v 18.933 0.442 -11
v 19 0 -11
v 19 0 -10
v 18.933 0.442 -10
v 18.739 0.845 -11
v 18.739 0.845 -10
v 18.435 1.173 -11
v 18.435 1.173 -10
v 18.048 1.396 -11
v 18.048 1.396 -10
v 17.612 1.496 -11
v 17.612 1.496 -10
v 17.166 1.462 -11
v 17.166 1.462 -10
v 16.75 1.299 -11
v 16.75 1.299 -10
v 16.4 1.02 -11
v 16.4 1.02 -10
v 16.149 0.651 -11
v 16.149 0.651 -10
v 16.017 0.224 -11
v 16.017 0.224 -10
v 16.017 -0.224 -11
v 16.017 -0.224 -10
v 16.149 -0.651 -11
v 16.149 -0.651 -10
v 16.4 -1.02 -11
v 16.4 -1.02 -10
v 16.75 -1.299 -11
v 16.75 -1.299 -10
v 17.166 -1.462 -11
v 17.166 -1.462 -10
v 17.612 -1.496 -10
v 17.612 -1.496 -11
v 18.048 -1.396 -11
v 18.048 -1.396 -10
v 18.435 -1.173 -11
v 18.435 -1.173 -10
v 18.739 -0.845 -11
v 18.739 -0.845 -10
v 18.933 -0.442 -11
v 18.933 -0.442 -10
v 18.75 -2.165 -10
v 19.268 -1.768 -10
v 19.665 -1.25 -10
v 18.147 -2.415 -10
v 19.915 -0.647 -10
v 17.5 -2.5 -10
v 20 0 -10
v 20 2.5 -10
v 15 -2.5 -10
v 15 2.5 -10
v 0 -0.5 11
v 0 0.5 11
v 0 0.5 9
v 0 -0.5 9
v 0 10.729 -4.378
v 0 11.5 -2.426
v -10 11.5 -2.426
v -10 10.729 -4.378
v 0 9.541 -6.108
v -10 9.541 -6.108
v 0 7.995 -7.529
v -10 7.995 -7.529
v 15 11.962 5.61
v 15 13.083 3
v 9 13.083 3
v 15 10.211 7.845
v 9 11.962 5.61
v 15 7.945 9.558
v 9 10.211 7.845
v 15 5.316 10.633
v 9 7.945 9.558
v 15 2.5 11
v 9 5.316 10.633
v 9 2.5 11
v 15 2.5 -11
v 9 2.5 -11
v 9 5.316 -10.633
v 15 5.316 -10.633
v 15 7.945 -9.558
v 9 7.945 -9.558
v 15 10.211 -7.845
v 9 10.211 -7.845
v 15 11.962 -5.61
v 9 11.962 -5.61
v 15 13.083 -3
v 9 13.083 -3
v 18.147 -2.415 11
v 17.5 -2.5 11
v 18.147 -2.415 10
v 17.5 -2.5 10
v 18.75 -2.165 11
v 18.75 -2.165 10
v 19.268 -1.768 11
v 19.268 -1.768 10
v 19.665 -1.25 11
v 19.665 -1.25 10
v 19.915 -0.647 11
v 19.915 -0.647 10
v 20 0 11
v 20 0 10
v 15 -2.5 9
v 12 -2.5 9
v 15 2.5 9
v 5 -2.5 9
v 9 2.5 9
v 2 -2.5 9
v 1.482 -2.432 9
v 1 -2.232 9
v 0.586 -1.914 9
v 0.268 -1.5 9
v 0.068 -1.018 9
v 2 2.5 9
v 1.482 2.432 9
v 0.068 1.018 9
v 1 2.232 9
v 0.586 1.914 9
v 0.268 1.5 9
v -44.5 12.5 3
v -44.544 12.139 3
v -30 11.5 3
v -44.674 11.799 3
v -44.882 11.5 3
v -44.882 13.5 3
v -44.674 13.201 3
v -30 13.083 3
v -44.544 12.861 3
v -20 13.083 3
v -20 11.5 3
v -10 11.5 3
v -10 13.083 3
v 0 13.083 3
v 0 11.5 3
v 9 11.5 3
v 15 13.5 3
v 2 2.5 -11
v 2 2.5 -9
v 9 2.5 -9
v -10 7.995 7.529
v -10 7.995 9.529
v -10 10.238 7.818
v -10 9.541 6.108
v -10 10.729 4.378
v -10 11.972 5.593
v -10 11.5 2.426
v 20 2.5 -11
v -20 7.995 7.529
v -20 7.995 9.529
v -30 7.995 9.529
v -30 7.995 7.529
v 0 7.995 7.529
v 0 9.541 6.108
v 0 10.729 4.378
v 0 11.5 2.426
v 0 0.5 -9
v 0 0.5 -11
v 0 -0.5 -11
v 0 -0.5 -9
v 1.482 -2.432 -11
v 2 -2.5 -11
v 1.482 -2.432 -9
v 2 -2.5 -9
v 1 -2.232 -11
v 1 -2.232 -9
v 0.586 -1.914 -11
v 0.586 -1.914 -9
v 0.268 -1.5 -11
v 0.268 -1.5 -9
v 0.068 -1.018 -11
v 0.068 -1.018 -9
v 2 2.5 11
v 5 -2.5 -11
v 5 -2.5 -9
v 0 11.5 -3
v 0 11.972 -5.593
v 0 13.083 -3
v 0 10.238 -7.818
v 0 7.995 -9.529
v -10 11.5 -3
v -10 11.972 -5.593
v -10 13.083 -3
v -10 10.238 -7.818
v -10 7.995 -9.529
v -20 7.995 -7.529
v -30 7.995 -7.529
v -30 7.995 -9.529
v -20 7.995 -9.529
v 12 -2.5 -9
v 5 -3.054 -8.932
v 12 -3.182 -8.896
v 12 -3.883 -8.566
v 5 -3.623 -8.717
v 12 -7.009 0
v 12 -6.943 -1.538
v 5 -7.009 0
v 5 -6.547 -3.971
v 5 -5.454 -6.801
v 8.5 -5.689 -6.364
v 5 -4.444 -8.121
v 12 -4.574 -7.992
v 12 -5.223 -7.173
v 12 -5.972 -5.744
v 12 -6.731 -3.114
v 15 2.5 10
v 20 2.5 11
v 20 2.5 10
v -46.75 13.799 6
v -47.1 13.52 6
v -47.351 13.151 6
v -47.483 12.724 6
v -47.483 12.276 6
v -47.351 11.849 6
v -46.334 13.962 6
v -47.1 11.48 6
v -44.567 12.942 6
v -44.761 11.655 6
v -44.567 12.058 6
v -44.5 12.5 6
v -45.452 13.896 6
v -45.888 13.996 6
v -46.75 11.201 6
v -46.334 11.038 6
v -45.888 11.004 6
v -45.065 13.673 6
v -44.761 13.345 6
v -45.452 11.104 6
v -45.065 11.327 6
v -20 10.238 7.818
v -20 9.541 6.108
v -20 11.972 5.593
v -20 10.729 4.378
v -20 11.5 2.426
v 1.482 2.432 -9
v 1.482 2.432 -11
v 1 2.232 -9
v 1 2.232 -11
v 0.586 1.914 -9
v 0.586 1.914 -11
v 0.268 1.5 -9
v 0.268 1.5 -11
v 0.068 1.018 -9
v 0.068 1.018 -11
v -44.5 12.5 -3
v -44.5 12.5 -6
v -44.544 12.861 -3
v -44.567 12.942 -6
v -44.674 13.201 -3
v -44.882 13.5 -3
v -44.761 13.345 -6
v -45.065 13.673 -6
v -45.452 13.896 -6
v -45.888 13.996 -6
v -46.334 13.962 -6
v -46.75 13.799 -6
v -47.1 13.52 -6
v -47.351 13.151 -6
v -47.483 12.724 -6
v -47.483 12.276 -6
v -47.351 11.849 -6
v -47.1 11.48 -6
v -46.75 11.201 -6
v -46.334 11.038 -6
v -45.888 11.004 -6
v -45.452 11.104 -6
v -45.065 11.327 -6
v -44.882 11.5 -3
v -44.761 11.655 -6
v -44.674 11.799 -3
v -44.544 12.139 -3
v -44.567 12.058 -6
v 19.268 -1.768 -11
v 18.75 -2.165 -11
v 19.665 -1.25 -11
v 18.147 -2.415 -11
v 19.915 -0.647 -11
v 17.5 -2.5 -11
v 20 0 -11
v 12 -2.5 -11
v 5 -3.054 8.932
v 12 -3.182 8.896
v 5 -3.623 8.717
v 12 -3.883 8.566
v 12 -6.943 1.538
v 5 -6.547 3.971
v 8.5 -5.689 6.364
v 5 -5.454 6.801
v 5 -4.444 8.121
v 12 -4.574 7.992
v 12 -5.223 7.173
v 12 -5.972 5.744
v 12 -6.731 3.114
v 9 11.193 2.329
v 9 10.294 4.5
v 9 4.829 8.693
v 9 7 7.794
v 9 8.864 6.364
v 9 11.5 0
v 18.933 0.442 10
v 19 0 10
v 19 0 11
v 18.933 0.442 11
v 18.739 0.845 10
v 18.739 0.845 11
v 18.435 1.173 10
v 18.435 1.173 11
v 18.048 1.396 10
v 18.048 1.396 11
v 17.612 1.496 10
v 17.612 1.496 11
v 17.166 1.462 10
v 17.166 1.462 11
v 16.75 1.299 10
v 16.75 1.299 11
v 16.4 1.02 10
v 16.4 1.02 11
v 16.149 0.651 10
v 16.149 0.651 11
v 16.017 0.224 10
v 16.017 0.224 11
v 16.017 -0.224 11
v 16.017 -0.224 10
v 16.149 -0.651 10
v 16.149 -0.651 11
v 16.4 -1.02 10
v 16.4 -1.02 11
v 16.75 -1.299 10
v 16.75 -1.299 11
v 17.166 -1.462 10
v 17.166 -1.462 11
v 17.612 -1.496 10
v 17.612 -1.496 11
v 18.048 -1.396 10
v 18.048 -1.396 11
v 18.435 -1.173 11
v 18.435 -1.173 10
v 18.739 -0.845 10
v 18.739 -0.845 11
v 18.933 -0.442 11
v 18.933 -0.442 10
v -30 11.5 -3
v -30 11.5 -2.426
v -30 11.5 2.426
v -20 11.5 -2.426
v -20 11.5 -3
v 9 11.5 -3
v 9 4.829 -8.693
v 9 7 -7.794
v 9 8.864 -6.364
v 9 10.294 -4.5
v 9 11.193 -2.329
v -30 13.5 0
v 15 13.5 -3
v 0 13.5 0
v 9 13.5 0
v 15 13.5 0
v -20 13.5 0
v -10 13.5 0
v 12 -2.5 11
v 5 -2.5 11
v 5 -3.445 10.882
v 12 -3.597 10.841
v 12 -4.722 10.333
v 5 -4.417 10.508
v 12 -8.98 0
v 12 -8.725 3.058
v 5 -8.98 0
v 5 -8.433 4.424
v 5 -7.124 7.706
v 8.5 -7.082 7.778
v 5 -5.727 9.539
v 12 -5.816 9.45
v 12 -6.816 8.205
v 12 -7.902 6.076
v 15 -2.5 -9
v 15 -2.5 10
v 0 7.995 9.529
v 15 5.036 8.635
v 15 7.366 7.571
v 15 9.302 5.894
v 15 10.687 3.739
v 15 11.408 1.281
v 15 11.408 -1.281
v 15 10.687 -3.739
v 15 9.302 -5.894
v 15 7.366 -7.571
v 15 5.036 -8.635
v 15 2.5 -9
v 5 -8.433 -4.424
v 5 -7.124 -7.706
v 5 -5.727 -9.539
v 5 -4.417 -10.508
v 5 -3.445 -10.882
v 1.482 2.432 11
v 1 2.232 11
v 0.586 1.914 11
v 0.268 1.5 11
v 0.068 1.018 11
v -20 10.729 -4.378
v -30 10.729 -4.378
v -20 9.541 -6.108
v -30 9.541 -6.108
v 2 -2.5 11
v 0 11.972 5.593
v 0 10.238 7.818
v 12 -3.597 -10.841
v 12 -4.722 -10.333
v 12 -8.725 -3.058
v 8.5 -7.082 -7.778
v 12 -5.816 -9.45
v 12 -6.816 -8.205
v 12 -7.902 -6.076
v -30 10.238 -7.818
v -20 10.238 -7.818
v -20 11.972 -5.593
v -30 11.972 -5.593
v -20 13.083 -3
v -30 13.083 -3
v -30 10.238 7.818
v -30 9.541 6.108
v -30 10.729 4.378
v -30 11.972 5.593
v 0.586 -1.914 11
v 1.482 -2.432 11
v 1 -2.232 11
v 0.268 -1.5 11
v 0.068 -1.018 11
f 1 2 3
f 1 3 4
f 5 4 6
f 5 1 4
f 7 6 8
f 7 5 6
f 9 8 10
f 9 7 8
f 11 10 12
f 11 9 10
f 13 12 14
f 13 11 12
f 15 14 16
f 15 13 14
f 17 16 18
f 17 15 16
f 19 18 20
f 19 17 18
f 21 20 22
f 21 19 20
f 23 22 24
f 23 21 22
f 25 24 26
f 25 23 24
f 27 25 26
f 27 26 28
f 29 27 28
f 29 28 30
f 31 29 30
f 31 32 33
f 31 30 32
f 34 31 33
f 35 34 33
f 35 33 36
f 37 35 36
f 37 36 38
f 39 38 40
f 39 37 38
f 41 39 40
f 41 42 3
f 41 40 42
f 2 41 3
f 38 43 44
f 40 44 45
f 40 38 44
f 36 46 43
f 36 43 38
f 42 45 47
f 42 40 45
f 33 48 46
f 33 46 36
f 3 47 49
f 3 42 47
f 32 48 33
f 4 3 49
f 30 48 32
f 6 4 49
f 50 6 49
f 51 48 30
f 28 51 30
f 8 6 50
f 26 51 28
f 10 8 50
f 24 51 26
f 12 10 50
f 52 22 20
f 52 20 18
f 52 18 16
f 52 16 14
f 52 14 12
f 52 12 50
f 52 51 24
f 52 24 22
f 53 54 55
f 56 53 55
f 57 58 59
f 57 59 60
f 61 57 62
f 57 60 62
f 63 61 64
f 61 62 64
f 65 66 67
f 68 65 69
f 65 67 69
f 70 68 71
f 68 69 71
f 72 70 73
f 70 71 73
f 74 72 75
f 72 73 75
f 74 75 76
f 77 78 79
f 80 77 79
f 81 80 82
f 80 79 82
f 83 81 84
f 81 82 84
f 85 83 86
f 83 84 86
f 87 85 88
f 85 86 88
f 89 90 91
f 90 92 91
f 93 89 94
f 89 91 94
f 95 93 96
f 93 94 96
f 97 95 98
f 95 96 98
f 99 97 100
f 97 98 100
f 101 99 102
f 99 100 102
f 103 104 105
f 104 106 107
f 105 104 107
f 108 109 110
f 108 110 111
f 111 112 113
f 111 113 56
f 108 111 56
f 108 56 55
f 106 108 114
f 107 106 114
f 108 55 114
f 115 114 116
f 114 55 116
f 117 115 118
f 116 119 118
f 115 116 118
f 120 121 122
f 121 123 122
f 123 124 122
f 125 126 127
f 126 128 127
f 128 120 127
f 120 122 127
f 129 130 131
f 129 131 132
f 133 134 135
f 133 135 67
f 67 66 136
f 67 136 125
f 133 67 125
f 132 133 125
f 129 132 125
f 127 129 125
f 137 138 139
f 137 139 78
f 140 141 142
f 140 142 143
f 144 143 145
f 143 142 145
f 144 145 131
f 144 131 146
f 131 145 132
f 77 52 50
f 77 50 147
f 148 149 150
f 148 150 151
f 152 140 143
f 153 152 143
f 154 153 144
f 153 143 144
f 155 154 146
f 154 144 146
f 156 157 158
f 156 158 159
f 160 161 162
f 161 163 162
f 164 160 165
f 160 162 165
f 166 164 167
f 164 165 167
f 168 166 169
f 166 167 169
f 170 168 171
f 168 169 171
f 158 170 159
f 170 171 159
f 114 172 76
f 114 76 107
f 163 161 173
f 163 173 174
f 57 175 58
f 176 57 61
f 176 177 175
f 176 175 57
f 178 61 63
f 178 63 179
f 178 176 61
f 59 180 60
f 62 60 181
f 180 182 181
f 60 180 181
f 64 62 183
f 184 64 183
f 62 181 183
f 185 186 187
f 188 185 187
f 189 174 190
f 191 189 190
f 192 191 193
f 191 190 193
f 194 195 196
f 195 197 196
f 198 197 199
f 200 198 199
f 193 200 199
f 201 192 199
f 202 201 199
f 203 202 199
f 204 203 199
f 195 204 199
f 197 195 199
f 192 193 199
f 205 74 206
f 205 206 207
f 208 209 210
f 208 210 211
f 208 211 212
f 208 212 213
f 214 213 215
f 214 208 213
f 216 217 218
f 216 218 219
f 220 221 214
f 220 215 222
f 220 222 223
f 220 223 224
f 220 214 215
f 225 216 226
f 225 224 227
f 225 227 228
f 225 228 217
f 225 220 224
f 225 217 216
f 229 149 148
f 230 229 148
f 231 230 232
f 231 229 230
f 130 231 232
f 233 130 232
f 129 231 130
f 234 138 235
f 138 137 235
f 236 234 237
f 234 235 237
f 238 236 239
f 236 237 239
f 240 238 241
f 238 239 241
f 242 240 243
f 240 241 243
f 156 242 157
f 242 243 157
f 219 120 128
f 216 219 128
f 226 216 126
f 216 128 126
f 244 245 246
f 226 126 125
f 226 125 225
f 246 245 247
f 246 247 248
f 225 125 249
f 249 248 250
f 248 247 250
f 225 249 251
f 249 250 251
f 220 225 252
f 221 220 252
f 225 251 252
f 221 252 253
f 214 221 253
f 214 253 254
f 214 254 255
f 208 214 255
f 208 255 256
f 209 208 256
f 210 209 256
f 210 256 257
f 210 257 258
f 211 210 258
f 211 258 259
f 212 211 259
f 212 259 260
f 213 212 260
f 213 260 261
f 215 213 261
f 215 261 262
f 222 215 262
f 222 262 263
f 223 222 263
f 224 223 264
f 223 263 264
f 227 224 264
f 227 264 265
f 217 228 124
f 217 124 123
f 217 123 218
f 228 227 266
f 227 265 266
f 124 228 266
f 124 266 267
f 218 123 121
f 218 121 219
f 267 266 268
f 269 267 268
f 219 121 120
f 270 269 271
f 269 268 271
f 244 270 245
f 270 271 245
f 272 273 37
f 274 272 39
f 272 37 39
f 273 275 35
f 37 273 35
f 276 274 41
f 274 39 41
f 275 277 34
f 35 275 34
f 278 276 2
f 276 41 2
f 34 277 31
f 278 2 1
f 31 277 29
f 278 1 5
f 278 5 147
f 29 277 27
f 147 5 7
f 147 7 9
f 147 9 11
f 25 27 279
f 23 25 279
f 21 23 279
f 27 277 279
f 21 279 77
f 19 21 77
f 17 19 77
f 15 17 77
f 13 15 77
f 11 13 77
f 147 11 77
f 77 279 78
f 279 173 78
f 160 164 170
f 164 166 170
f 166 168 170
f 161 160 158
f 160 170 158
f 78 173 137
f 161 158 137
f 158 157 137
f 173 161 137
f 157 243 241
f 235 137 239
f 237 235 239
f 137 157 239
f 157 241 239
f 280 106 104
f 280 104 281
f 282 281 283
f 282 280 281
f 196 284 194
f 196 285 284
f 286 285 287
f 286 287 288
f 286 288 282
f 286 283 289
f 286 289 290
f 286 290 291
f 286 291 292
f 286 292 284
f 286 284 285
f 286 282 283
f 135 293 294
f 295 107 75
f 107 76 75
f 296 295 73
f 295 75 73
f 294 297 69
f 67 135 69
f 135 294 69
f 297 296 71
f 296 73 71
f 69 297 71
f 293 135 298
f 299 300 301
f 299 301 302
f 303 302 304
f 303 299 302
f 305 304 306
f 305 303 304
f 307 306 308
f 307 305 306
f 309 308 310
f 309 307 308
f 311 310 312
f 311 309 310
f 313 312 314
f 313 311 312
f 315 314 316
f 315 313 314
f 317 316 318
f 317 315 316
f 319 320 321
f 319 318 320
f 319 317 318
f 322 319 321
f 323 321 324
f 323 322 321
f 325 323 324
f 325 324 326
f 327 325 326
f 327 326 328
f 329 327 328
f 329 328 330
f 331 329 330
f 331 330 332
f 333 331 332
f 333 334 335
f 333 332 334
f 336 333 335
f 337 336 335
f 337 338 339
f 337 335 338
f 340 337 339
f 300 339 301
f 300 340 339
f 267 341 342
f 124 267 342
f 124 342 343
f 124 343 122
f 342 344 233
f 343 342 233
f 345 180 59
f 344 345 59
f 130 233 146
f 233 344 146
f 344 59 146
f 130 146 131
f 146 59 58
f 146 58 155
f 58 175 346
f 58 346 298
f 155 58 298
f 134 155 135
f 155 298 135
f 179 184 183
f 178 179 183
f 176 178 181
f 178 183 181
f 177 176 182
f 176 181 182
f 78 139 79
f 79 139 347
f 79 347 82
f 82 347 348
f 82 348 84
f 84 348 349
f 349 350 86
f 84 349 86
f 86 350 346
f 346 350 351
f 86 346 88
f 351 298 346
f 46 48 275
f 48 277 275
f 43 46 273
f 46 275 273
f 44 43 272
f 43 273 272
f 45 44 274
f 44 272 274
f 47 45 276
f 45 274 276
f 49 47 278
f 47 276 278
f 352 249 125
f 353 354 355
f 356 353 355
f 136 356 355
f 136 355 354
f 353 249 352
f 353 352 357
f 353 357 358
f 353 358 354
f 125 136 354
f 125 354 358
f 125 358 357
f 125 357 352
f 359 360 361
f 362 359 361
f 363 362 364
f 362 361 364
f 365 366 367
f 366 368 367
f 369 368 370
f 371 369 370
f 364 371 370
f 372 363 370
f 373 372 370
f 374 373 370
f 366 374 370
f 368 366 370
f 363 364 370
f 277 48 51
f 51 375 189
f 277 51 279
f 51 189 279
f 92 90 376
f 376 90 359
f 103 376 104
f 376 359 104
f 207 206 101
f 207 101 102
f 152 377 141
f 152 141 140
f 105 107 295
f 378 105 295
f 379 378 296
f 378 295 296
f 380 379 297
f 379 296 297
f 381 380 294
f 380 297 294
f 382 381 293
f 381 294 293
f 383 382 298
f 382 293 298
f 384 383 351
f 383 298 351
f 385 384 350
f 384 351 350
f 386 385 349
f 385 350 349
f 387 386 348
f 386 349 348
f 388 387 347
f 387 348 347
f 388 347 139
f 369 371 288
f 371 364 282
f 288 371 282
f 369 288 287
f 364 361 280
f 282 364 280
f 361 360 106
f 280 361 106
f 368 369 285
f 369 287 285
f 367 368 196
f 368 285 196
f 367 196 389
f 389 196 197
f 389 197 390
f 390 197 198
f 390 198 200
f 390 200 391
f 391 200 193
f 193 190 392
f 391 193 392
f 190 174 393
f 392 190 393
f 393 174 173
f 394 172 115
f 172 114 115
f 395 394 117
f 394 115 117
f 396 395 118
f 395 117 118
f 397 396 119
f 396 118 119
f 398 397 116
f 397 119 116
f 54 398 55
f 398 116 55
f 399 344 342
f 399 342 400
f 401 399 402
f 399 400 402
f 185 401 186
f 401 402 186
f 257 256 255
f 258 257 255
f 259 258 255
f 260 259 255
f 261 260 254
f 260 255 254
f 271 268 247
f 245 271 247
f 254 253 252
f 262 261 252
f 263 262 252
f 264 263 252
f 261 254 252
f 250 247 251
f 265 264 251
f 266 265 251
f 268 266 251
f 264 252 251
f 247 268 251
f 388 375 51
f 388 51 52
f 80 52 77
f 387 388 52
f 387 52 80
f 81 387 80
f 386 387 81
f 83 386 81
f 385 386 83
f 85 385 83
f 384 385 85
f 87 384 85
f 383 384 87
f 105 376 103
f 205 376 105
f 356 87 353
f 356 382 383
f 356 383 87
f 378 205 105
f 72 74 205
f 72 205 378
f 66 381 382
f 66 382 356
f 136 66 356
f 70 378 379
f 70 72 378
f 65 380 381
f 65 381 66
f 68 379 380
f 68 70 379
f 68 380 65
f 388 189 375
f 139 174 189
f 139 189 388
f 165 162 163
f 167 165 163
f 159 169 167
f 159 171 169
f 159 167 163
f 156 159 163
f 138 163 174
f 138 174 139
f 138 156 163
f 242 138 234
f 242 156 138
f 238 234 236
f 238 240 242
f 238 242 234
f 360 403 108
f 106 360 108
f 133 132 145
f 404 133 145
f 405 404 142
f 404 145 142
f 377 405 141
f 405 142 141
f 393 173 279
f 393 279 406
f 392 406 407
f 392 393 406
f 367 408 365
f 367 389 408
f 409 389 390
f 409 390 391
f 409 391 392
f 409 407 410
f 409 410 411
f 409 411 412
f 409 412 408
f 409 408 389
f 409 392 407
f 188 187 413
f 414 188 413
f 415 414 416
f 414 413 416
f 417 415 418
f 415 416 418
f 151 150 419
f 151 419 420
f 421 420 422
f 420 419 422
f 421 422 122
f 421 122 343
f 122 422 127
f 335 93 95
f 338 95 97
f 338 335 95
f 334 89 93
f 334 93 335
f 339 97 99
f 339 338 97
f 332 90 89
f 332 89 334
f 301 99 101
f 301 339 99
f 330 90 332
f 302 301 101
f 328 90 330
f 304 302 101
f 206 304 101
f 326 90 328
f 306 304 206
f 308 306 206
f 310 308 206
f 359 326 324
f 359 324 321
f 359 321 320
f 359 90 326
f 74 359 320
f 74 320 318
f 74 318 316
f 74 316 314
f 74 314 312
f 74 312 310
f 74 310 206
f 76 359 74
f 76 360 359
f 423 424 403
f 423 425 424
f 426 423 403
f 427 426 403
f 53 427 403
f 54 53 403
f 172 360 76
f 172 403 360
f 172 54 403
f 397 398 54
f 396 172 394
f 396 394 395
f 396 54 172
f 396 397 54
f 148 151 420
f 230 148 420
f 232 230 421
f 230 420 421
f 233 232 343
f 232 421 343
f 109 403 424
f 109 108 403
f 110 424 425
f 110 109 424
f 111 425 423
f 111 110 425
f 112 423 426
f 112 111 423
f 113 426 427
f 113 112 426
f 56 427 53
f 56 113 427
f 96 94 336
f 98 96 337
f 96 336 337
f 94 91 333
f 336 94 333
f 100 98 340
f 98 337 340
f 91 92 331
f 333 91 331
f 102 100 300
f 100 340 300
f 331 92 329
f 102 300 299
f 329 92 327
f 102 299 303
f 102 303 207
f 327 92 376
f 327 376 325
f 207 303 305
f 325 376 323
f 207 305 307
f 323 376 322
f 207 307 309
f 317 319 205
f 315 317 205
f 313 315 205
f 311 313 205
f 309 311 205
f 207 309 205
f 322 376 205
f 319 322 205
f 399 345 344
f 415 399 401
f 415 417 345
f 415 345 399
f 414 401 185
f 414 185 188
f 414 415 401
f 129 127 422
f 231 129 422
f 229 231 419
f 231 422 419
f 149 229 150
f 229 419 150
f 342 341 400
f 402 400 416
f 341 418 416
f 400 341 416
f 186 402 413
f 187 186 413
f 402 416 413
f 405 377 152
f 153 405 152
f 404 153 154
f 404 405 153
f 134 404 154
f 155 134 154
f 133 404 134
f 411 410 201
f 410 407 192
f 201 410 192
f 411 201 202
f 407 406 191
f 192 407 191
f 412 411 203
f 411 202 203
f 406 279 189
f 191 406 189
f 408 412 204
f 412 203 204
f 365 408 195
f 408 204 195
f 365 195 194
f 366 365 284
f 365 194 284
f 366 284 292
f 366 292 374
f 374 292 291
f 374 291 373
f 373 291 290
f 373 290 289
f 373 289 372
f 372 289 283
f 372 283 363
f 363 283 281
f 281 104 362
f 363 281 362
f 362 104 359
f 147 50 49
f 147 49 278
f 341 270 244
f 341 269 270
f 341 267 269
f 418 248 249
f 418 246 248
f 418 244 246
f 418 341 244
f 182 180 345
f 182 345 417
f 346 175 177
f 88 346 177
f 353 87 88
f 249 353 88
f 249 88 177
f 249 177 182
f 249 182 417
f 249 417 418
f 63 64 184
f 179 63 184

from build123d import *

# Parameters (mm, degrees)
SKETCH1_W                = 2
SKETCH1_H                = 5
BOSS_EXTRUDE1_DEPTH      = 15
BOSS_EXTRUDE1_2_DEPTH    = 15
SKETCH2_W                = 1
SKETCH2_H                = 5
BOSS_EXTRUDE2_DEPTH      = 5
CUT_EXTRUDE1_DEPTH       = 30.107559156
CUT_EXTRUDE1_DEPTH_BACK  = 30.107559156
SKETCH3_R                = 1.5
SWEEP1_START             = 9
SWEEP1_DEPTH             = 6
BOSS_EXTRUDE3_DEPTH      = 12
CUT_EXTRUDE2_DEPTH       = 5
FILLET1_R                = 2
BOSS_EXTRUDE6_START      = -6
SKETCH7_W                = 6
SKETCH7_H                = 2
BOSS_EXTRUDE6_DEPTH      = 61
BOSS_EXTRUDE7_DEPTH      = 3
BOSS_EXTRUDE7_DEPTH_BACK = 9
SKETCH8_R                = 1.5
FILLET2_R                = 2.5
BOSS_EXTRUDE10_DEPTH     = 10
LPATTERN1_COUNT          = 2
LPATTERN1_PITCH          = 20


# Read off the part's stored shape, not the designer's step: Sweep1
with BuildPart() as part:
    # Sketch1 → Boss-Extrude1 (new body)
    with BuildSketch(Plane(origin=(0, 0, 0), x_dir=(0, 0, -1), z_dir=(1, 0, 0))):
        with Locations((-10, 0)):
            Rectangle(SKETCH1_W, SKETCH1_H)
    extrude(amount=BOSS_EXTRUDE1_DEPTH)



with BuildPart() as body_2:
    # Sketch1 → Boss-Extrude1 2 (new body)
    with BuildSketch(Plane(origin=(0, 0, 0), x_dir=(0, 0, -1), z_dir=(1, 0, 0))):
        with Locations((10, 0)):
            Rectangle(SKETCH1_W, SKETCH1_H)
    extrude(amount=BOSS_EXTRUDE1_2_DEPTH)


with BuildPart() as part_1:
    add(part.part)

    add(body_2.part)  # Boss-Extrude2 merges body 2
    # Sketch2 → Boss-Extrude2 (add)
    with BuildSketch(Plane(origin=(15, 0, 0), x_dir=(0, 0, -1), z_dir=(1, 0, 0))):
        with Locations((10.5, 0)):
            Rectangle(SKETCH2_W, SKETCH2_H)
        with Locations((-10.5, 0)):
            Rectangle(SKETCH2_W, SKETCH2_H)
    extrude(amount=BOSS_EXTRUDE2_DEPTH)

    # Sketch3 → Cut-Extrude1 (cut, two sides: drawn at the far end of the back side and taken through both)
    with BuildSketch(Plane.XY.offset(-10).offset(-CUT_EXTRUDE1_DEPTH_BACK)):
        with Locations((17.5, 0)):
            Circle(SKETCH3_R)
    extrude(amount=CUT_EXTRUDE1_DEPTH + CUT_EXTRUDE1_DEPTH_BACK, mode=Mode.SUBTRACT)

    # Sweep1 outline → Sweep1 (add)
    with BuildSketch(Plane.YZ.offset(SWEEP1_START)):
        with BuildLine():
            ThreePointArc((2.5, -11), (13.5, 0), (2.5, 11))
            Line((2.5, 11), (2.5, 9))
            ThreePointArc((2.5, 9), (11.5, 0), (2.5, -9))
            Line((2.5, -9), (2.5, -11))
        make_face()
    extrude(amount=SWEEP1_DEPTH)

    # Sketch5 → Boss-Extrude3 (add)
    with BuildSketch(Plane(origin=(0, 0, 0), x_dir=(0, 0, -1), z_dir=(1, 0, 0))):
        with BuildLine():
            Line((-9, -2.5), (-11, -2.5))
            add(Edge.make_bspline(
                [(-11, -2.5), (-11, -8.980170496), (0, -8.980170496)],
                knots=[3.141592654, 3.141592654, 3.141592654, 4.71238898, 4.71238898, 4.71238898], degree=2, weights=[1, 0.707106781, 1]))
            Line((0, -8.980170496), (0, -7.009343108))
            add(Edge.make_bspline(
                [(-9, -2.5), (-9, -7.009343108), (0, -7.009343108)],
                knots=[3.141592654, 3.141592654, 3.141592654, 4.71238898, 4.71238898, 4.71238898], degree=2, weights=[1, 0.707106781, 1]))
        make_face()
    boss_extrude3 = extrude(amount=BOSS_EXTRUDE3_DEPTH)

    # Sketch6 → Cut-Extrude2 (cut)
    with BuildSketch(Plane.ZY):
        with BuildLine():
            Line((11, -2.5), (9, -2.5))
            add(Edge.make_bspline(
                [(0, -7.009343108), (9, -7.009343108), (9, -2.5)],
                knots=[4.71238898, 4.71238898, 4.71238898, 6.283185307, 6.283185307, 6.283185307], degree=2, weights=[1, 0.707106781, 1]))
            Line((0, -7.009343108), (0, -8.980170496))
            add(Edge.make_bspline(
                [(0, -8.980170496), (11, -8.980170496), (11, -2.5)],
                knots=[4.71238898, 4.71238898, 4.71238898, 6.283185307, 6.283185307, 6.283185307], degree=2, weights=[1, 0.707106781, 1]))
        make_face()
    cut_extrude2 = extrude(amount=-CUT_EXTRUDE2_DEPTH, mode=Mode.SUBTRACT)

    # Mirror2: Boss-Extrude3, Cut-Extrude2 across plane
    add(boss_extrude3.mirror(Plane(origin=(12, -8.980170496, 0), x_dir=(1, 0, 0), z_dir=(0, 0, 1))))
    add(cut_extrude2.mirror(Plane(origin=(12, -8.980170496, 0), x_dir=(1, 0, 0), z_dir=(0, 0, 1))), mode=Mode.SUBTRACT)

    # Fillet1
    fillet1_edges = [part_1.edges().sort_by_distance(p)[0] for p in [
        (0, -2.5, -10),
        (0, 2.5, -10),
        (0, 2.5, 10),
        (0, -2.5, 10),
    ]]
    fillet(fillet1_edges, radius=FILLET1_R)

    # Sketch7 → Boss-Extrude6 (add)
    with BuildSketch(Plane.ZY.offset(-9).offset(BOSS_EXTRUDE6_START)):
        with Locations((0, 12.5)):
            Rectangle(SKETCH7_W, SKETCH7_H)
    extrude(amount=BOSS_EXTRUDE6_DEPTH)

    # Sketch8 → Boss-Extrude7 (add, two sides: drawn at the far end of the back side and taken through both)
    with BuildSketch(Plane.XY.offset(3).offset(-BOSS_EXTRUDE7_DEPTH_BACK)):
        with Locations((-46, 12.5)):
            Circle(SKETCH8_R)
    extrude(amount=BOSS_EXTRUDE7_DEPTH + BOSS_EXTRUDE7_DEPTH_BACK)

    # Fillet2
    fillet2_edges = [part_1.edges().sort_by_distance(p)[0] for p in [
        (20, -2.5, -10.5),
        (20, -2.5, 10.5),
    ]]
    fillet(fillet2_edges, radius=FILLET2_R)

    # 3DSketch3 → Boss-Extrude10 (add)
    with BuildSketch(Plane(origin=(-10, 7.995255445, 9.529017137), x_dir=(0, 0, -1), z_dir=(1, 0, 0))):
        with BuildLine():
            Line((0, 0), (2, 0))
            ThreePointArc((2, 0), (9.529017137, 3.825899604), (17.058034273, 0))
            Line((17.058034273, 0), (19.058034273, 0))
            ThreePointArc((19.058034273, 0), (15.031388903, 4.029654263), (9.529017137, 5.504744555))
            ThreePointArc((9.529017137, 5.504744555), (4.026645371, 4.029654263), (0, 0))
        make_face()
    boss_extrude10 = extrude(amount=BOSS_EXTRUDE10_DEPTH)

    # LPattern1: Boss-Extrude10 ×2
    with Locations(*[(-i * LPATTERN1_PITCH, 0, 0) for i in range(1, LPATTERN1_COUNT)]):
        add(boss_extrude10)


solid = part_1.part
